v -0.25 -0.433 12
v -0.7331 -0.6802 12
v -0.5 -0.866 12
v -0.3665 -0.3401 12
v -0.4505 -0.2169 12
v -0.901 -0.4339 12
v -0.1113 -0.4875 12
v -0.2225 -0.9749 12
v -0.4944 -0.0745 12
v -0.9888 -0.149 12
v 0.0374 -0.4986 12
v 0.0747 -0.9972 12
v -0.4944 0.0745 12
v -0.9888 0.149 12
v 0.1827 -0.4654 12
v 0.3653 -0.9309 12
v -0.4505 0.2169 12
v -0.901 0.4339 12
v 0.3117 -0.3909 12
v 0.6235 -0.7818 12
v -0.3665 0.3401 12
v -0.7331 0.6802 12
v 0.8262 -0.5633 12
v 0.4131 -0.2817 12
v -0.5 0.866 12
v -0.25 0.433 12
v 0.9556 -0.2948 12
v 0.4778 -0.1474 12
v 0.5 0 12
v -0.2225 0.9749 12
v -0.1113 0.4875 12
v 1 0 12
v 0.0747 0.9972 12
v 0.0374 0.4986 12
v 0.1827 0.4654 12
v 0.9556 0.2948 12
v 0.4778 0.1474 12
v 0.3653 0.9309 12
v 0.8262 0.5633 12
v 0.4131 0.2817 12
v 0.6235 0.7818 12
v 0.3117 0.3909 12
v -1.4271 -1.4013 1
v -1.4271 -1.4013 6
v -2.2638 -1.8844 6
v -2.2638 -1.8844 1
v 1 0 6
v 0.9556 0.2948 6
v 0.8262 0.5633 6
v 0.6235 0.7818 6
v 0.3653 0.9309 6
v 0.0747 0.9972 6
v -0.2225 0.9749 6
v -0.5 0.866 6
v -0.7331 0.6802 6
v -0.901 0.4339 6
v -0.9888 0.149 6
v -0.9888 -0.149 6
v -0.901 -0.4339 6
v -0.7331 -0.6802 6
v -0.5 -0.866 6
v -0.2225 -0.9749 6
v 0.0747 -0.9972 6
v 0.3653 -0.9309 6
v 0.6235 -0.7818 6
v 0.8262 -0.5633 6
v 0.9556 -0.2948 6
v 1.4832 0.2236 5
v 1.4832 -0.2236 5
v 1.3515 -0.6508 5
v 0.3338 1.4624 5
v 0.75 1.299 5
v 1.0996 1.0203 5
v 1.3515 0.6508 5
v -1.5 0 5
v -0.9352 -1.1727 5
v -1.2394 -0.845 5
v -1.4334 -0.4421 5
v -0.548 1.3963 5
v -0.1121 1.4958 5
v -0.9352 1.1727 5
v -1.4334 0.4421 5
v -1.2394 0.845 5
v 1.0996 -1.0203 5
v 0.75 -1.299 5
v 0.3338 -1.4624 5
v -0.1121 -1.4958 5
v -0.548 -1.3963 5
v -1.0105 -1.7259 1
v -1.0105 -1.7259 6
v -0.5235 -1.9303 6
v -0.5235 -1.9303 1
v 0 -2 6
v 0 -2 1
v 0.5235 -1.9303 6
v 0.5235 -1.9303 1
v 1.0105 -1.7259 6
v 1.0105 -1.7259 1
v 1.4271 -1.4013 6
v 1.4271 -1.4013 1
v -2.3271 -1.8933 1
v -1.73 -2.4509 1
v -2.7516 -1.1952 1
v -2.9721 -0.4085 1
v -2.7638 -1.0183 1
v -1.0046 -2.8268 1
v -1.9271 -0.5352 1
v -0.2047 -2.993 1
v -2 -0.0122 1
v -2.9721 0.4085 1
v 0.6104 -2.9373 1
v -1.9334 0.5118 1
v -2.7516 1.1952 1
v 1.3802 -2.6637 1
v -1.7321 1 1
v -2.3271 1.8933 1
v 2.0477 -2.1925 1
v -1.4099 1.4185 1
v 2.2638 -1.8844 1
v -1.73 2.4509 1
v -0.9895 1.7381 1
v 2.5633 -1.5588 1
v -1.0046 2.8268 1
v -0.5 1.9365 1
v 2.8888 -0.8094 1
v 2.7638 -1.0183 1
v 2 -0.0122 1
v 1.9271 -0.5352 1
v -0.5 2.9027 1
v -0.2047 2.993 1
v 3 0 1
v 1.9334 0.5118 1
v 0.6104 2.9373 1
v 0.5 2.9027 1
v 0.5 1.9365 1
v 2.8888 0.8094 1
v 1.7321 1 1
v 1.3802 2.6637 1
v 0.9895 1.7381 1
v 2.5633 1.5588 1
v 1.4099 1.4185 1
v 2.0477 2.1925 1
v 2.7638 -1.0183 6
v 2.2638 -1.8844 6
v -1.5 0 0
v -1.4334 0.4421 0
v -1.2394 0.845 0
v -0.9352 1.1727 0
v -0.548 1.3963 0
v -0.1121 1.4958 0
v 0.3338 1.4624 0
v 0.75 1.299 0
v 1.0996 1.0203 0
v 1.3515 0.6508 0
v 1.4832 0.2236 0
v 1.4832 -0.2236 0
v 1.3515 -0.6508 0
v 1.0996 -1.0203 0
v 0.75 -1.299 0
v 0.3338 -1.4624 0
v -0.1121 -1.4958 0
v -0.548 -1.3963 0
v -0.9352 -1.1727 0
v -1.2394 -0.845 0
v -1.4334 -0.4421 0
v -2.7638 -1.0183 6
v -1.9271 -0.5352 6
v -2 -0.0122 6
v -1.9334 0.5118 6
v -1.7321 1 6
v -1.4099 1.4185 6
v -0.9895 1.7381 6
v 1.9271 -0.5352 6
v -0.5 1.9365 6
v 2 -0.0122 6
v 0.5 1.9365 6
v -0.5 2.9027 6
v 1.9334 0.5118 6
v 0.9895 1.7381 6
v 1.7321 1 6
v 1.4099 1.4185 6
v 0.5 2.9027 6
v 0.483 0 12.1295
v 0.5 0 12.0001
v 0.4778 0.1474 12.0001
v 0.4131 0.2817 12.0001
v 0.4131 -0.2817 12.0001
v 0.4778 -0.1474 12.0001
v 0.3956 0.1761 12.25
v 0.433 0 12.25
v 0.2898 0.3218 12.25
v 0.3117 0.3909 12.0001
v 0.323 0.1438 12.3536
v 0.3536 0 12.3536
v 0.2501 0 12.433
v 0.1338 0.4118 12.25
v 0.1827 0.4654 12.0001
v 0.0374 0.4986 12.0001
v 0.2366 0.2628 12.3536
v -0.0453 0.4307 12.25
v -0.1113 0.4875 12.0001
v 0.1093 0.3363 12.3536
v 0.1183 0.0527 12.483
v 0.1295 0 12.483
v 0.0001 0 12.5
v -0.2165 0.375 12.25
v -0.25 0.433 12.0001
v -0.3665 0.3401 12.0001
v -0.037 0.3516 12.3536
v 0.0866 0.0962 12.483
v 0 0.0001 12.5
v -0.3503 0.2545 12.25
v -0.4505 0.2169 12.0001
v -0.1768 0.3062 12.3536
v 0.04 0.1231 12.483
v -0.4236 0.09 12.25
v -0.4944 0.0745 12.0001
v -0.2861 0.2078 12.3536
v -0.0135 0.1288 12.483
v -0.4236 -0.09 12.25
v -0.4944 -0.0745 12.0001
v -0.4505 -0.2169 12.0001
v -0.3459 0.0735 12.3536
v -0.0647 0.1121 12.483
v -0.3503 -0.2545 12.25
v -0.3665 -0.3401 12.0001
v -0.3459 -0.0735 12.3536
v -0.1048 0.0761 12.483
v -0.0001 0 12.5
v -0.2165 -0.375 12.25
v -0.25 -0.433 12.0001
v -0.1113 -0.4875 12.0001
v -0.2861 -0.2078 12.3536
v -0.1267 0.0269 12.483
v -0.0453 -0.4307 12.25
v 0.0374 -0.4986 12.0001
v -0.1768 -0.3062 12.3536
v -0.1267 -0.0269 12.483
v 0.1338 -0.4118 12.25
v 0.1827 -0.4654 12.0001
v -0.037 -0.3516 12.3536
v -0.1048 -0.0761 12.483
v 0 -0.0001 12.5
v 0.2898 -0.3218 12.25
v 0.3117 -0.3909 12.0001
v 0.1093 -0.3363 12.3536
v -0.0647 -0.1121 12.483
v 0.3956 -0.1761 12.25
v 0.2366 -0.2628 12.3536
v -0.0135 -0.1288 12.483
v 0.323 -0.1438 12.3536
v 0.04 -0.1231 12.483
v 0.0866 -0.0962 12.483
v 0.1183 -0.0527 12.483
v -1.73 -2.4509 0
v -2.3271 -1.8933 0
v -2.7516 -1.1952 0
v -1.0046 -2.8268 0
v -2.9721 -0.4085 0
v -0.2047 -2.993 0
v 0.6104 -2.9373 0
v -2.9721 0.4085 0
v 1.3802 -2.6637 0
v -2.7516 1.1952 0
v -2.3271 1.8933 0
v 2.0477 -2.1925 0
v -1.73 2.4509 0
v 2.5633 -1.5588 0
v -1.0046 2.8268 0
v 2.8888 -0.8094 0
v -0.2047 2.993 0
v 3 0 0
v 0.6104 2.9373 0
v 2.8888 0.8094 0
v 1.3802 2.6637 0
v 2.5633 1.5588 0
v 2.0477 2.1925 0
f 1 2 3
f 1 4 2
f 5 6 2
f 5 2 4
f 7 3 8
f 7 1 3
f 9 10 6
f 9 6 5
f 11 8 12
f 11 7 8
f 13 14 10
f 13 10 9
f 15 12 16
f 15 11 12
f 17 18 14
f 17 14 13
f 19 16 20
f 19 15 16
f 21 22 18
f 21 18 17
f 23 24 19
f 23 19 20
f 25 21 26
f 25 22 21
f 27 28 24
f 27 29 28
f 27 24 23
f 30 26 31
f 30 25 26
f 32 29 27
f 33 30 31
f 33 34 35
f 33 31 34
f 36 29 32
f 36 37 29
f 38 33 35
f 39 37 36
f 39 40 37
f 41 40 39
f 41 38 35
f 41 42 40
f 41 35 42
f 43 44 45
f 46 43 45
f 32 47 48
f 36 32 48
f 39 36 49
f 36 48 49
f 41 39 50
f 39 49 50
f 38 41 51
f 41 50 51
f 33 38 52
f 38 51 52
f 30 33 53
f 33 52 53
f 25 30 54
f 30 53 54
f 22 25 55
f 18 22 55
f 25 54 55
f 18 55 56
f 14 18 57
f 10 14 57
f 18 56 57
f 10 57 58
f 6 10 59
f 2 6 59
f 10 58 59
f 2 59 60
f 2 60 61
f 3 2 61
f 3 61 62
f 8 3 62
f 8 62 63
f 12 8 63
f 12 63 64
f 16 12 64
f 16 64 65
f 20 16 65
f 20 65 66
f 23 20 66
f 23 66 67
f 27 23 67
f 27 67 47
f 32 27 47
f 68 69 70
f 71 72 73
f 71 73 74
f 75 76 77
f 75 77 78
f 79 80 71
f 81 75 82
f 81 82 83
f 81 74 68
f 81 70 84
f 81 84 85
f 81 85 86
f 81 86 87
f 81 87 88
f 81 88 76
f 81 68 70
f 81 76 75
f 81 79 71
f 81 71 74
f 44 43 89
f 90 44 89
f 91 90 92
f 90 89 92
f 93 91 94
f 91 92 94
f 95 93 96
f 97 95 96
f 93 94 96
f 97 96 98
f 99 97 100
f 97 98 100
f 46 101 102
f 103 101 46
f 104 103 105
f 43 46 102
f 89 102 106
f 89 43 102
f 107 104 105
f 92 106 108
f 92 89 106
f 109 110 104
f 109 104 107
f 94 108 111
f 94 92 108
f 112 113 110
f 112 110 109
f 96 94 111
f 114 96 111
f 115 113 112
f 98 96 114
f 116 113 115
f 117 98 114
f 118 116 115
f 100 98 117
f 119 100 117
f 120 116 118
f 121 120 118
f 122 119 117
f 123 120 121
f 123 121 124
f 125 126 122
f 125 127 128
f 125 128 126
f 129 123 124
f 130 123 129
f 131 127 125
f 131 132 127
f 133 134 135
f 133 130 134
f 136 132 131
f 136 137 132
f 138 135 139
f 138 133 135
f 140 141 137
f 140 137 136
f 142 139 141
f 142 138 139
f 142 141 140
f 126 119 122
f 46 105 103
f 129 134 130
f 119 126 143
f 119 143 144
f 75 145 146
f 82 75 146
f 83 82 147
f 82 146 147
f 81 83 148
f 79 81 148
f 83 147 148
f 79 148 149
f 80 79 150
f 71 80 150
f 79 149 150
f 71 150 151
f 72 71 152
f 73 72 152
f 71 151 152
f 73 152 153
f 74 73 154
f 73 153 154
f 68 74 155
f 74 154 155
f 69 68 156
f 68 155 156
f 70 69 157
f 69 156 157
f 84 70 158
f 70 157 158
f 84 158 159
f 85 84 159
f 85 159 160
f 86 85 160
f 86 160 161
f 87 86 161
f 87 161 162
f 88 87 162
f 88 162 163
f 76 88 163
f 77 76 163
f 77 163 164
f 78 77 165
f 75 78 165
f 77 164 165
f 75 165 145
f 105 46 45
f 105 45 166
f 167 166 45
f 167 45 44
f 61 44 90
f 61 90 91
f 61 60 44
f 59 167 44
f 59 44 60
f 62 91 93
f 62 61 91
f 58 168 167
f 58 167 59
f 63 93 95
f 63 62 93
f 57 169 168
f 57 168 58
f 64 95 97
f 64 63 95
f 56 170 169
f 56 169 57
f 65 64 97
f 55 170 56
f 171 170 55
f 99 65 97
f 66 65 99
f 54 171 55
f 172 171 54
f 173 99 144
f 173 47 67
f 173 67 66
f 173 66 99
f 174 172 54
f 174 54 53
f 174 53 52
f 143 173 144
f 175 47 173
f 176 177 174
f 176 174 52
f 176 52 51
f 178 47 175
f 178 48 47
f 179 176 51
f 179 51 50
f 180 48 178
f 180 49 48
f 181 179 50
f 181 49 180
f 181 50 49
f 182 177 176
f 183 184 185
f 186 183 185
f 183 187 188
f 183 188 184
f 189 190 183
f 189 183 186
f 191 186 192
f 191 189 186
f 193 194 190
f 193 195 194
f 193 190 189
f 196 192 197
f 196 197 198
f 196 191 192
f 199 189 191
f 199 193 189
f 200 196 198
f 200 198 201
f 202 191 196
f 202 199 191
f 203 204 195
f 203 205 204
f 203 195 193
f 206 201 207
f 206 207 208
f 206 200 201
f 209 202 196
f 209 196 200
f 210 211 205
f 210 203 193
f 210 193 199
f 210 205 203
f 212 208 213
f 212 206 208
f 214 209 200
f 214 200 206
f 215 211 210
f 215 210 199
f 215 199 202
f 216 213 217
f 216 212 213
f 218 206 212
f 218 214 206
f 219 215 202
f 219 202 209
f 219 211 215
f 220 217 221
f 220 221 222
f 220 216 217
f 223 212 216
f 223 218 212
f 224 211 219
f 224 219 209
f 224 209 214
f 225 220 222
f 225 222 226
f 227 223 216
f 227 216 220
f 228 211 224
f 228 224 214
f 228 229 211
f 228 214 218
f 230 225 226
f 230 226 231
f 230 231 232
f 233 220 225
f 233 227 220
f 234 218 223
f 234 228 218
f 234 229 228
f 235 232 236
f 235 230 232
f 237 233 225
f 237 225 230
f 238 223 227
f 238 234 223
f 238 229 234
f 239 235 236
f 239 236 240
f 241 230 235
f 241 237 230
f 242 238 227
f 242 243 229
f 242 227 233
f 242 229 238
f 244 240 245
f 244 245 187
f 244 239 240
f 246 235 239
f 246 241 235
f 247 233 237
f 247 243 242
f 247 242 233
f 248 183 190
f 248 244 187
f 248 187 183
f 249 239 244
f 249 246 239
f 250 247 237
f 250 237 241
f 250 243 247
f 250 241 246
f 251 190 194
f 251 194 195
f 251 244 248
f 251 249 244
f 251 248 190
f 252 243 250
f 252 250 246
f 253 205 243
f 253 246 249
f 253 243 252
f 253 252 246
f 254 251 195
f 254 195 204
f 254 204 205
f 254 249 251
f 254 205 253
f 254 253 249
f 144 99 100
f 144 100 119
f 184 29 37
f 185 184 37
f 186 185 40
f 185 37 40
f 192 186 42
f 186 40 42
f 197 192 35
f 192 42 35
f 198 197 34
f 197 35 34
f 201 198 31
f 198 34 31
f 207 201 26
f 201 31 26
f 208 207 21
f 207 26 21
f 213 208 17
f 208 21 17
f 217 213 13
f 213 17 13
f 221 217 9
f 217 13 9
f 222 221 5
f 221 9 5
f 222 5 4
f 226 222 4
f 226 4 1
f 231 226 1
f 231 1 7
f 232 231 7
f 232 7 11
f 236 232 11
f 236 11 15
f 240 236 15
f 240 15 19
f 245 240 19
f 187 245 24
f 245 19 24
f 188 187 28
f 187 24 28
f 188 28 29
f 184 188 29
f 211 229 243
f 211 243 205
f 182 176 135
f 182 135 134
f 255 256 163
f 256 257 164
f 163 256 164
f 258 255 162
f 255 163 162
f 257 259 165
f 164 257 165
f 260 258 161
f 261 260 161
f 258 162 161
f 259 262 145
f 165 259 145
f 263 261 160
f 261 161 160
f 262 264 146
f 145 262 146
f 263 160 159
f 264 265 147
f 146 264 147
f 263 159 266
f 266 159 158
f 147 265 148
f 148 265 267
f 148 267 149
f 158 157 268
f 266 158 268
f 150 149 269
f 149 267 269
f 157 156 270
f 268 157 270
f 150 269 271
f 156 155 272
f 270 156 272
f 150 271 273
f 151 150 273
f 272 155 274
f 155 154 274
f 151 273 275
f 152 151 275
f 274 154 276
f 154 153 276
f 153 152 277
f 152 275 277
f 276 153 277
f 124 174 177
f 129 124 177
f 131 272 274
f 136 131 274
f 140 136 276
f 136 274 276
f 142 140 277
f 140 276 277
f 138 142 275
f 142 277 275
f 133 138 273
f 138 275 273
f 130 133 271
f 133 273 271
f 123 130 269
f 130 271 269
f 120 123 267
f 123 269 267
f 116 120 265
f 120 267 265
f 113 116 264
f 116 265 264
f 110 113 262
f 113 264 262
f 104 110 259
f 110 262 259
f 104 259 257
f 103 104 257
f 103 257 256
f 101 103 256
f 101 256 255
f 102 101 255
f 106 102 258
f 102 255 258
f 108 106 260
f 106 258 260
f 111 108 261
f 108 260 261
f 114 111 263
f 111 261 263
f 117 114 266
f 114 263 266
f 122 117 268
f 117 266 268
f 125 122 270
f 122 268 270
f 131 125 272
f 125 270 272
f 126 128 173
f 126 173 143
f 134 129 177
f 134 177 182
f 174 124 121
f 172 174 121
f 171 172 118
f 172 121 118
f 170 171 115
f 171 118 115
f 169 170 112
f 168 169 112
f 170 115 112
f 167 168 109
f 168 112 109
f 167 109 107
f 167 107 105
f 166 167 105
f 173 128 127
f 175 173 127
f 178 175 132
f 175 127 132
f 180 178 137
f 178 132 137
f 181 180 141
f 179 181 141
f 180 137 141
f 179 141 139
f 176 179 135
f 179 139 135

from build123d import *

# Parameters (mm, degrees)
SKETCH1_R           = 3
BOSS_EXTRUDE1_DEPTH = 1
SKETCH2_R           = 2
BOSS_EXTRUDE2_DEPTH = 5
SKETCH3_R           = 1
BOSS_EXTRUDE3_DEPTH = 6
SKETCH4_R           = 0.5
BOSS_EXTRUDE4_DEPTH = 0.5
FILLET2_R           = 0.5
SKETCH5_W           = 1
SKETCH5_H           = 1.914506357
BOSS_EXTRUDE5_DEPTH = 5
CIRPATTERN1_COUNT   = 3
SKETCH6_R           = 1.5
CUT_EXTRUDE1_DEPTH  = 5


with BuildPart() as part:
    # Sketch1 → Boss-Extrude1 (new body)
    with BuildSketch(Plane.XY):
        Circle(SKETCH1_R)
    extrude(amount=BOSS_EXTRUDE1_DEPTH)

    # Sketch2 → Boss-Extrude2 (add)
    with BuildSketch(Plane.XY.offset(1)):
        Circle(SKETCH2_R)
    extrude(amount=BOSS_EXTRUDE2_DEPTH)

    # Sketch3 → Boss-Extrude3 (add)
    with BuildSketch(Plane.XY.offset(6)):
        Circle(SKETCH3_R)
    extrude(amount=BOSS_EXTRUDE3_DEPTH)

    # Sketch4 → Boss-Extrude4 (add)
    with BuildSketch(Plane.XY.offset(12)):
        Circle(SKETCH4_R)
    extrude(amount=BOSS_EXTRUDE4_DEPTH)

    # Fillet2
    fillet2_edges = [part.edges().sort_by_distance(p)[0] for p in [
        (-0.5, 0, 12.5),
    ]]
    fillet(fillet2_edges, radius=FILLET2_R - 0.0001)  # a hair under: the kernel refuses the full size

    # Sketch5 → Boss-Extrude5 (add)
    with BuildSketch(Plane.XY.offset(1)):
        with Locations((0, 1.945455643)):
            Rectangle(SKETCH5_W, SKETCH5_H)
    boss_extrude5 = extrude(amount=BOSS_EXTRUDE5_DEPTH)

    # CirPattern1: Boss-Extrude5 ×3 about axis
    cirpattern1_axis = Axis((0, 0, 0), (0, 0, 1))
    for i in range(1, CIRPATTERN1_COUNT):
        add(boss_extrude5.rotate(cirpattern1_axis, i * 360 / CIRPATTERN1_COUNT))

    # Sketch6 → Cut-Extrude1 (cut)
    with BuildSketch(Plane(origin=(0, 0, 0), x_dir=(-1, 0, 0), z_dir=(0, 0, -1))):
        Circle(SKETCH6_R)
    extrude(amount=-CUT_EXTRUDE1_DEPTH, mode=Mode.SUBTRACT)


solid = part.part
